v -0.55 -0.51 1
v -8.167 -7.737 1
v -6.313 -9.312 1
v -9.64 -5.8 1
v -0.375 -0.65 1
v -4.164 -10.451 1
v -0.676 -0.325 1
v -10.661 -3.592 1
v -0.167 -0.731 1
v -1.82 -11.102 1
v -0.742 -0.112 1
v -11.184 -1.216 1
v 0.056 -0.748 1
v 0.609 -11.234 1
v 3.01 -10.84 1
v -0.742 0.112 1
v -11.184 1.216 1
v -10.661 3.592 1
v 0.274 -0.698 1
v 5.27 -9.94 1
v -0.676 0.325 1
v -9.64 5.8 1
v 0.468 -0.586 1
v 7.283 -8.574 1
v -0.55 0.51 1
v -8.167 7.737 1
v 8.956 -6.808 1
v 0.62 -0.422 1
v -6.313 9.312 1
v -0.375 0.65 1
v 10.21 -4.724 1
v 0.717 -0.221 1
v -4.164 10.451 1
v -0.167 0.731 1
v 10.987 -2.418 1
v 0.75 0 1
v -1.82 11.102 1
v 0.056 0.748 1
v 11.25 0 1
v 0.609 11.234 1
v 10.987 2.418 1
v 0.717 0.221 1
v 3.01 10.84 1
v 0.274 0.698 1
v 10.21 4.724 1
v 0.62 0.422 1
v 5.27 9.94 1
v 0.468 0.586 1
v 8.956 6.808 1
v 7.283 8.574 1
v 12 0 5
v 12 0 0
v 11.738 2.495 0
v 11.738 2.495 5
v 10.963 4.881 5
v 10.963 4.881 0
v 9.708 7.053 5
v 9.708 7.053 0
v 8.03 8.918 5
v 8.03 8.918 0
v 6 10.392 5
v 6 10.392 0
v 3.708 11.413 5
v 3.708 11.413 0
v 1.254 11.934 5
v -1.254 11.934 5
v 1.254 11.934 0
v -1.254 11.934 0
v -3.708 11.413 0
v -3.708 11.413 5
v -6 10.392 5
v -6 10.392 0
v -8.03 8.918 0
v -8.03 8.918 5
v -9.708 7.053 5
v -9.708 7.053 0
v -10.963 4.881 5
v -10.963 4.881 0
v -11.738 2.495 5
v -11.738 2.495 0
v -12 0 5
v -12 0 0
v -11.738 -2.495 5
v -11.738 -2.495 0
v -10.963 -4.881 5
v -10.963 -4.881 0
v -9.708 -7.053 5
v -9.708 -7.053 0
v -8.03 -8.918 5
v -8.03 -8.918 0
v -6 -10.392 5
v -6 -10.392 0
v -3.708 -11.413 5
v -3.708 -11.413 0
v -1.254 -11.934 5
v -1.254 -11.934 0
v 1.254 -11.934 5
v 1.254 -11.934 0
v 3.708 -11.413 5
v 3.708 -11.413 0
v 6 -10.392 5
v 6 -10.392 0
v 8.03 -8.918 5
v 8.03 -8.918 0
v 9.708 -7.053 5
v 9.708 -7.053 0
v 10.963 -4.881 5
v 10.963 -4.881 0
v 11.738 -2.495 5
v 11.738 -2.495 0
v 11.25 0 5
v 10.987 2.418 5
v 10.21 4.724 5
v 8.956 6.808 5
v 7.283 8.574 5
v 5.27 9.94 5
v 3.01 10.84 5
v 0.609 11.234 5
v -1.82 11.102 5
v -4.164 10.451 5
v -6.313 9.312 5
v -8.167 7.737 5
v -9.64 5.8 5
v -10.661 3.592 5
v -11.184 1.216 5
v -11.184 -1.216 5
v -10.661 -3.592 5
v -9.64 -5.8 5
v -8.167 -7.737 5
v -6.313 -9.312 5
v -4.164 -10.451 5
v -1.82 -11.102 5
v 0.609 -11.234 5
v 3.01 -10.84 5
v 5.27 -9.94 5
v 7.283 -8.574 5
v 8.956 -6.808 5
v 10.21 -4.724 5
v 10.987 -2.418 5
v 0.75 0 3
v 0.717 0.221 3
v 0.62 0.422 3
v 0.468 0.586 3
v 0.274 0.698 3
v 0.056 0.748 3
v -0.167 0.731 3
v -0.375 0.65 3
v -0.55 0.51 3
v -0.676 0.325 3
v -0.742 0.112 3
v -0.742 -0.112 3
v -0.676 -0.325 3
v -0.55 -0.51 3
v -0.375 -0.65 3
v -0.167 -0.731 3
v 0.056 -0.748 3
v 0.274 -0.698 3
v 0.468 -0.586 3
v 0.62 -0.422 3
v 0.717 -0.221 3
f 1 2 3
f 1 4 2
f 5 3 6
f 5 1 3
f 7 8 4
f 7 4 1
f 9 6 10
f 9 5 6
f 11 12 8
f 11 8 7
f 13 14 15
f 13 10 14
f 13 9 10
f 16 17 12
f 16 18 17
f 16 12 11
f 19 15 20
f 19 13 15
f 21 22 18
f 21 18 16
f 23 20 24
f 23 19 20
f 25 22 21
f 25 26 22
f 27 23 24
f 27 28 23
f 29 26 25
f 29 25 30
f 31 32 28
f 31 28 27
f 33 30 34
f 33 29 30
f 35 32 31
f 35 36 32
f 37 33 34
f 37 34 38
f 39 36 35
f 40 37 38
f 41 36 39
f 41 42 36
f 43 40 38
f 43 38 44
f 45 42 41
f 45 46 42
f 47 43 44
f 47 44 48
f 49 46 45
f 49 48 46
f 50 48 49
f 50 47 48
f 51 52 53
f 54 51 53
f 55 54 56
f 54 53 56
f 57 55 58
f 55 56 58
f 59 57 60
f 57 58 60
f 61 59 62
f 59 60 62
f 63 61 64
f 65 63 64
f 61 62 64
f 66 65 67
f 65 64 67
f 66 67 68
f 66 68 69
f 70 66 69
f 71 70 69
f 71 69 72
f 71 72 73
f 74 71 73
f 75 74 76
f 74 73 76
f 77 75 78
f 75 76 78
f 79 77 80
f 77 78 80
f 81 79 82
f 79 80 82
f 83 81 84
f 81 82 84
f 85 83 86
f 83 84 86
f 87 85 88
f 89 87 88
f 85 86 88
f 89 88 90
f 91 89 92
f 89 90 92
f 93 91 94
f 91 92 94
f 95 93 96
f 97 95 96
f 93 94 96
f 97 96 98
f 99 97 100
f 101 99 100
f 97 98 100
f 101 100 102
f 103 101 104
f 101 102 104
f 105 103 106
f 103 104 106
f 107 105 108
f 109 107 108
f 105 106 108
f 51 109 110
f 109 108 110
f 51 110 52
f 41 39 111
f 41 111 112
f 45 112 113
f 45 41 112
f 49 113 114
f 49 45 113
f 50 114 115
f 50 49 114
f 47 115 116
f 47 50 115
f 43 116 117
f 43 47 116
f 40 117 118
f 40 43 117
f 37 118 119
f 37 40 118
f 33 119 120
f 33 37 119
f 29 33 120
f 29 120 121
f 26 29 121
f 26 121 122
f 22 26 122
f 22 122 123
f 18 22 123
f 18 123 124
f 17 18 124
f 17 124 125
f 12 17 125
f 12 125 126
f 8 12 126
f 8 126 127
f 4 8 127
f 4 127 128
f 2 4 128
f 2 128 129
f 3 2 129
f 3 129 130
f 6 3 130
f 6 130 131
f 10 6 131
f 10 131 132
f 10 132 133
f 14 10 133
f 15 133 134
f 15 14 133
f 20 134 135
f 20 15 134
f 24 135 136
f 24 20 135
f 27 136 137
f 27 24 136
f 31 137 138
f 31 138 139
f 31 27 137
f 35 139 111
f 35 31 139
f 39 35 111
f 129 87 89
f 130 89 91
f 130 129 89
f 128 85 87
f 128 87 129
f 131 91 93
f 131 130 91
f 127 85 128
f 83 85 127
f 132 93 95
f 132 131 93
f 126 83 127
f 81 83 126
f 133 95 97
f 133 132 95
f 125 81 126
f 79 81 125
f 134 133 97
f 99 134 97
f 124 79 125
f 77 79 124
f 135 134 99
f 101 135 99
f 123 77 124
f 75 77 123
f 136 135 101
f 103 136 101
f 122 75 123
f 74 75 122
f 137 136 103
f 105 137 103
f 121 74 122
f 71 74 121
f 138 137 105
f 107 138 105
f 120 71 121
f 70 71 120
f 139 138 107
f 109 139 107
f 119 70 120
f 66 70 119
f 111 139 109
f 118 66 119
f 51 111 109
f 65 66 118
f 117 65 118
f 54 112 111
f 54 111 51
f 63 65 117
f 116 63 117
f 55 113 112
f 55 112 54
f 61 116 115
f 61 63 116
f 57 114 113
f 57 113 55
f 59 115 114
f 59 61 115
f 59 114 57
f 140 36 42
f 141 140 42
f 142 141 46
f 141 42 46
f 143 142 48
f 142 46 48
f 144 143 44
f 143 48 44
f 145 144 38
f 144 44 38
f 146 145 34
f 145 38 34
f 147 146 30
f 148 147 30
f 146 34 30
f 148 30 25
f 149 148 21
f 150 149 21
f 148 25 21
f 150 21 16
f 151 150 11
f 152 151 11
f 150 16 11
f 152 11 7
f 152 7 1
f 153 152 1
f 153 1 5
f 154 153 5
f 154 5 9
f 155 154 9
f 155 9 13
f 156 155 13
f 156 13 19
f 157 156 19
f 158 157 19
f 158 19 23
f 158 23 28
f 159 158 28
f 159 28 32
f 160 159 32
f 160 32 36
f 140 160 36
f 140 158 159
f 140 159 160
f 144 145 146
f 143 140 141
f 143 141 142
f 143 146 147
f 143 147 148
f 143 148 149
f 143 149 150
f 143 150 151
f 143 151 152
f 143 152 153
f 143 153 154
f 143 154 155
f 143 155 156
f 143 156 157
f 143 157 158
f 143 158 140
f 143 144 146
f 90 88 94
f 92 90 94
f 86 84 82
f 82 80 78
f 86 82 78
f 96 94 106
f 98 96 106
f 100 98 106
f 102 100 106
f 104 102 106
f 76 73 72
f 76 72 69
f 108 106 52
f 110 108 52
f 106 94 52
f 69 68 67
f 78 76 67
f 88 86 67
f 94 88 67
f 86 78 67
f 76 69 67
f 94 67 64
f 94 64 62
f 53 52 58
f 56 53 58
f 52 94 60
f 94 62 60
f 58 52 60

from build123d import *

# Parameters (mm, degrees)
F0_R     = 11.75
F1_DEPTH = 1
F2_R     = 12
F2_R_2   = 11.25
F3_DEPTH = 5
F4_R     = 0.75
F5_DEPTH = 3


with BuildPart() as f1:
    # F0 (on Top) → F1 (new body)
    with BuildSketch(Plane.XY):
        Circle(F0_R)
    extrude(amount=F1_DEPTH)

    # F2 (on Top) → F3 (join)
    with BuildSketch(Plane.XY):
        Circle(F2_R)
        Circle(F2_R_2, mode=Mode.SUBTRACT)
    extrude(amount=F3_DEPTH)

    # F4 (on Top) → F5 (join)
    with BuildSketch(Plane.XY):
        Circle(F4_R)
    extrude(amount=F5_DEPTH)


solid = f1.part
